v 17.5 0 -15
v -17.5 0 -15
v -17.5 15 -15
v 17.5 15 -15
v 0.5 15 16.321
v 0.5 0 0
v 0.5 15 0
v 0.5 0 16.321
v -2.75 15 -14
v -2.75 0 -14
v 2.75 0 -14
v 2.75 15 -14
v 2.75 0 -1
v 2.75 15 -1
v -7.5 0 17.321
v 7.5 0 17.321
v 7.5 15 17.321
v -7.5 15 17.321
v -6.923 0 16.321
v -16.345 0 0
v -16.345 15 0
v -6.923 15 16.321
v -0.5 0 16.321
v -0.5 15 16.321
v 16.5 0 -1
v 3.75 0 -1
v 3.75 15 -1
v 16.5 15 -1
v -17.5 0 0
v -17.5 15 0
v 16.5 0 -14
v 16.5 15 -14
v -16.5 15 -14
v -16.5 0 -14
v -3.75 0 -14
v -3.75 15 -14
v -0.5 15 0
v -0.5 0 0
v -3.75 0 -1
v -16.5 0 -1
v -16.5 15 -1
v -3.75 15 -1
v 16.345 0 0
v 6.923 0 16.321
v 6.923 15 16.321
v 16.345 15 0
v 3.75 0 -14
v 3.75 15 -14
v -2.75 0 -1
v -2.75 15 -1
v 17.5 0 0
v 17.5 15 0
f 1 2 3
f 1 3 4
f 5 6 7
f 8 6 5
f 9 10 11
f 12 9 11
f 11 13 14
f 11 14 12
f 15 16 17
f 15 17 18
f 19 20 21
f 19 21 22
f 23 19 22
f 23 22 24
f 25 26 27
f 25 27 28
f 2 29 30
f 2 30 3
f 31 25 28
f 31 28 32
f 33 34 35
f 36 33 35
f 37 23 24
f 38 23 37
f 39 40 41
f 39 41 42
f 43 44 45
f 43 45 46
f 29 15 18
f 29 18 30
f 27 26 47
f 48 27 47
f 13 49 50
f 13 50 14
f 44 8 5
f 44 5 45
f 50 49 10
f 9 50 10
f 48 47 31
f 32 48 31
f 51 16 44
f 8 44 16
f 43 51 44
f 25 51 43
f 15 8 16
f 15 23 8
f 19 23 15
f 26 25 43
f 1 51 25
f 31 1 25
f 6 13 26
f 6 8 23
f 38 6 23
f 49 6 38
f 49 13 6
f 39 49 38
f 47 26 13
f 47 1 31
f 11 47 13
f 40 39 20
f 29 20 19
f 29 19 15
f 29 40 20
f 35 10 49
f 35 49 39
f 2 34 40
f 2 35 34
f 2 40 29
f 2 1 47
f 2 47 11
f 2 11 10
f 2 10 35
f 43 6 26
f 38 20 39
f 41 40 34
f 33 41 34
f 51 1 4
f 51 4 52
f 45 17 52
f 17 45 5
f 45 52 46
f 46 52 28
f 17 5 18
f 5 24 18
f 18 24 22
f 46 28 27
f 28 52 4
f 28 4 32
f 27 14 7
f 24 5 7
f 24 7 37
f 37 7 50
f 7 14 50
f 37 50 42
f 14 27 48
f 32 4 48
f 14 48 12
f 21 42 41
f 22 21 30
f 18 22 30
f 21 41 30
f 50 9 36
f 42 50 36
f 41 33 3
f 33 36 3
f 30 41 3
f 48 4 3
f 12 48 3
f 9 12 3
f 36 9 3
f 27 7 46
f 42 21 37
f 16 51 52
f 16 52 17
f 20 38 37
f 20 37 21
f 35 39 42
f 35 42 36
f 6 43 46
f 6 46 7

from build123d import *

# Parameters (mm, degrees)
SFIVEBASETP1_W     = 12.75
SFIVEBASETP1_H     = 13
SFIVEBASETP1_W_2   = 5.5
FFIVEBASETP1_DEPTH = 15


with BuildPart() as part:
    # SFiveBaseTP1 → FFiveBaseTP1 (new body)
    with BuildSketch(Plane(origin=(0, 0, 0), x_dir=(1, 0, 0), z_dir=(0, 1, 0))):
        Polygon((-17.5, 15), (17.5, 15), (17.5, 0), (7.5, -17.320508076), (-7.5, -17.320508076), (-17.5, 0), align=None)
        Polygon((-16.345299462, 0), (-6.922649731, -16.320508076), (-0.5, -16.320508076), (-0.5, 0), align=None, mode=Mode.SUBTRACT)
        with Locations((-10.125, 7.5)):
            Rectangle(SFIVEBASETP1_W, SFIVEBASETP1_H, mode=Mode.SUBTRACT)
        with Locations((10.125, 7.5)):
            Rectangle(SFIVEBASETP1_W, SFIVEBASETP1_H, mode=Mode.SUBTRACT)
        Polygon((0.5, 0), (0.5, -16.320508076), (6.922649731, -16.320508076), (16.345299462, 0), align=None, mode=Mode.SUBTRACT)
        with Locations((0, 7.5)):
            Rectangle(SFIVEBASETP1_W_2, SFIVEBASETP1_H, mode=Mode.SUBTRACT)
    extrude(amount=FFIVEBASETP1_DEPTH)


solid = part.part
